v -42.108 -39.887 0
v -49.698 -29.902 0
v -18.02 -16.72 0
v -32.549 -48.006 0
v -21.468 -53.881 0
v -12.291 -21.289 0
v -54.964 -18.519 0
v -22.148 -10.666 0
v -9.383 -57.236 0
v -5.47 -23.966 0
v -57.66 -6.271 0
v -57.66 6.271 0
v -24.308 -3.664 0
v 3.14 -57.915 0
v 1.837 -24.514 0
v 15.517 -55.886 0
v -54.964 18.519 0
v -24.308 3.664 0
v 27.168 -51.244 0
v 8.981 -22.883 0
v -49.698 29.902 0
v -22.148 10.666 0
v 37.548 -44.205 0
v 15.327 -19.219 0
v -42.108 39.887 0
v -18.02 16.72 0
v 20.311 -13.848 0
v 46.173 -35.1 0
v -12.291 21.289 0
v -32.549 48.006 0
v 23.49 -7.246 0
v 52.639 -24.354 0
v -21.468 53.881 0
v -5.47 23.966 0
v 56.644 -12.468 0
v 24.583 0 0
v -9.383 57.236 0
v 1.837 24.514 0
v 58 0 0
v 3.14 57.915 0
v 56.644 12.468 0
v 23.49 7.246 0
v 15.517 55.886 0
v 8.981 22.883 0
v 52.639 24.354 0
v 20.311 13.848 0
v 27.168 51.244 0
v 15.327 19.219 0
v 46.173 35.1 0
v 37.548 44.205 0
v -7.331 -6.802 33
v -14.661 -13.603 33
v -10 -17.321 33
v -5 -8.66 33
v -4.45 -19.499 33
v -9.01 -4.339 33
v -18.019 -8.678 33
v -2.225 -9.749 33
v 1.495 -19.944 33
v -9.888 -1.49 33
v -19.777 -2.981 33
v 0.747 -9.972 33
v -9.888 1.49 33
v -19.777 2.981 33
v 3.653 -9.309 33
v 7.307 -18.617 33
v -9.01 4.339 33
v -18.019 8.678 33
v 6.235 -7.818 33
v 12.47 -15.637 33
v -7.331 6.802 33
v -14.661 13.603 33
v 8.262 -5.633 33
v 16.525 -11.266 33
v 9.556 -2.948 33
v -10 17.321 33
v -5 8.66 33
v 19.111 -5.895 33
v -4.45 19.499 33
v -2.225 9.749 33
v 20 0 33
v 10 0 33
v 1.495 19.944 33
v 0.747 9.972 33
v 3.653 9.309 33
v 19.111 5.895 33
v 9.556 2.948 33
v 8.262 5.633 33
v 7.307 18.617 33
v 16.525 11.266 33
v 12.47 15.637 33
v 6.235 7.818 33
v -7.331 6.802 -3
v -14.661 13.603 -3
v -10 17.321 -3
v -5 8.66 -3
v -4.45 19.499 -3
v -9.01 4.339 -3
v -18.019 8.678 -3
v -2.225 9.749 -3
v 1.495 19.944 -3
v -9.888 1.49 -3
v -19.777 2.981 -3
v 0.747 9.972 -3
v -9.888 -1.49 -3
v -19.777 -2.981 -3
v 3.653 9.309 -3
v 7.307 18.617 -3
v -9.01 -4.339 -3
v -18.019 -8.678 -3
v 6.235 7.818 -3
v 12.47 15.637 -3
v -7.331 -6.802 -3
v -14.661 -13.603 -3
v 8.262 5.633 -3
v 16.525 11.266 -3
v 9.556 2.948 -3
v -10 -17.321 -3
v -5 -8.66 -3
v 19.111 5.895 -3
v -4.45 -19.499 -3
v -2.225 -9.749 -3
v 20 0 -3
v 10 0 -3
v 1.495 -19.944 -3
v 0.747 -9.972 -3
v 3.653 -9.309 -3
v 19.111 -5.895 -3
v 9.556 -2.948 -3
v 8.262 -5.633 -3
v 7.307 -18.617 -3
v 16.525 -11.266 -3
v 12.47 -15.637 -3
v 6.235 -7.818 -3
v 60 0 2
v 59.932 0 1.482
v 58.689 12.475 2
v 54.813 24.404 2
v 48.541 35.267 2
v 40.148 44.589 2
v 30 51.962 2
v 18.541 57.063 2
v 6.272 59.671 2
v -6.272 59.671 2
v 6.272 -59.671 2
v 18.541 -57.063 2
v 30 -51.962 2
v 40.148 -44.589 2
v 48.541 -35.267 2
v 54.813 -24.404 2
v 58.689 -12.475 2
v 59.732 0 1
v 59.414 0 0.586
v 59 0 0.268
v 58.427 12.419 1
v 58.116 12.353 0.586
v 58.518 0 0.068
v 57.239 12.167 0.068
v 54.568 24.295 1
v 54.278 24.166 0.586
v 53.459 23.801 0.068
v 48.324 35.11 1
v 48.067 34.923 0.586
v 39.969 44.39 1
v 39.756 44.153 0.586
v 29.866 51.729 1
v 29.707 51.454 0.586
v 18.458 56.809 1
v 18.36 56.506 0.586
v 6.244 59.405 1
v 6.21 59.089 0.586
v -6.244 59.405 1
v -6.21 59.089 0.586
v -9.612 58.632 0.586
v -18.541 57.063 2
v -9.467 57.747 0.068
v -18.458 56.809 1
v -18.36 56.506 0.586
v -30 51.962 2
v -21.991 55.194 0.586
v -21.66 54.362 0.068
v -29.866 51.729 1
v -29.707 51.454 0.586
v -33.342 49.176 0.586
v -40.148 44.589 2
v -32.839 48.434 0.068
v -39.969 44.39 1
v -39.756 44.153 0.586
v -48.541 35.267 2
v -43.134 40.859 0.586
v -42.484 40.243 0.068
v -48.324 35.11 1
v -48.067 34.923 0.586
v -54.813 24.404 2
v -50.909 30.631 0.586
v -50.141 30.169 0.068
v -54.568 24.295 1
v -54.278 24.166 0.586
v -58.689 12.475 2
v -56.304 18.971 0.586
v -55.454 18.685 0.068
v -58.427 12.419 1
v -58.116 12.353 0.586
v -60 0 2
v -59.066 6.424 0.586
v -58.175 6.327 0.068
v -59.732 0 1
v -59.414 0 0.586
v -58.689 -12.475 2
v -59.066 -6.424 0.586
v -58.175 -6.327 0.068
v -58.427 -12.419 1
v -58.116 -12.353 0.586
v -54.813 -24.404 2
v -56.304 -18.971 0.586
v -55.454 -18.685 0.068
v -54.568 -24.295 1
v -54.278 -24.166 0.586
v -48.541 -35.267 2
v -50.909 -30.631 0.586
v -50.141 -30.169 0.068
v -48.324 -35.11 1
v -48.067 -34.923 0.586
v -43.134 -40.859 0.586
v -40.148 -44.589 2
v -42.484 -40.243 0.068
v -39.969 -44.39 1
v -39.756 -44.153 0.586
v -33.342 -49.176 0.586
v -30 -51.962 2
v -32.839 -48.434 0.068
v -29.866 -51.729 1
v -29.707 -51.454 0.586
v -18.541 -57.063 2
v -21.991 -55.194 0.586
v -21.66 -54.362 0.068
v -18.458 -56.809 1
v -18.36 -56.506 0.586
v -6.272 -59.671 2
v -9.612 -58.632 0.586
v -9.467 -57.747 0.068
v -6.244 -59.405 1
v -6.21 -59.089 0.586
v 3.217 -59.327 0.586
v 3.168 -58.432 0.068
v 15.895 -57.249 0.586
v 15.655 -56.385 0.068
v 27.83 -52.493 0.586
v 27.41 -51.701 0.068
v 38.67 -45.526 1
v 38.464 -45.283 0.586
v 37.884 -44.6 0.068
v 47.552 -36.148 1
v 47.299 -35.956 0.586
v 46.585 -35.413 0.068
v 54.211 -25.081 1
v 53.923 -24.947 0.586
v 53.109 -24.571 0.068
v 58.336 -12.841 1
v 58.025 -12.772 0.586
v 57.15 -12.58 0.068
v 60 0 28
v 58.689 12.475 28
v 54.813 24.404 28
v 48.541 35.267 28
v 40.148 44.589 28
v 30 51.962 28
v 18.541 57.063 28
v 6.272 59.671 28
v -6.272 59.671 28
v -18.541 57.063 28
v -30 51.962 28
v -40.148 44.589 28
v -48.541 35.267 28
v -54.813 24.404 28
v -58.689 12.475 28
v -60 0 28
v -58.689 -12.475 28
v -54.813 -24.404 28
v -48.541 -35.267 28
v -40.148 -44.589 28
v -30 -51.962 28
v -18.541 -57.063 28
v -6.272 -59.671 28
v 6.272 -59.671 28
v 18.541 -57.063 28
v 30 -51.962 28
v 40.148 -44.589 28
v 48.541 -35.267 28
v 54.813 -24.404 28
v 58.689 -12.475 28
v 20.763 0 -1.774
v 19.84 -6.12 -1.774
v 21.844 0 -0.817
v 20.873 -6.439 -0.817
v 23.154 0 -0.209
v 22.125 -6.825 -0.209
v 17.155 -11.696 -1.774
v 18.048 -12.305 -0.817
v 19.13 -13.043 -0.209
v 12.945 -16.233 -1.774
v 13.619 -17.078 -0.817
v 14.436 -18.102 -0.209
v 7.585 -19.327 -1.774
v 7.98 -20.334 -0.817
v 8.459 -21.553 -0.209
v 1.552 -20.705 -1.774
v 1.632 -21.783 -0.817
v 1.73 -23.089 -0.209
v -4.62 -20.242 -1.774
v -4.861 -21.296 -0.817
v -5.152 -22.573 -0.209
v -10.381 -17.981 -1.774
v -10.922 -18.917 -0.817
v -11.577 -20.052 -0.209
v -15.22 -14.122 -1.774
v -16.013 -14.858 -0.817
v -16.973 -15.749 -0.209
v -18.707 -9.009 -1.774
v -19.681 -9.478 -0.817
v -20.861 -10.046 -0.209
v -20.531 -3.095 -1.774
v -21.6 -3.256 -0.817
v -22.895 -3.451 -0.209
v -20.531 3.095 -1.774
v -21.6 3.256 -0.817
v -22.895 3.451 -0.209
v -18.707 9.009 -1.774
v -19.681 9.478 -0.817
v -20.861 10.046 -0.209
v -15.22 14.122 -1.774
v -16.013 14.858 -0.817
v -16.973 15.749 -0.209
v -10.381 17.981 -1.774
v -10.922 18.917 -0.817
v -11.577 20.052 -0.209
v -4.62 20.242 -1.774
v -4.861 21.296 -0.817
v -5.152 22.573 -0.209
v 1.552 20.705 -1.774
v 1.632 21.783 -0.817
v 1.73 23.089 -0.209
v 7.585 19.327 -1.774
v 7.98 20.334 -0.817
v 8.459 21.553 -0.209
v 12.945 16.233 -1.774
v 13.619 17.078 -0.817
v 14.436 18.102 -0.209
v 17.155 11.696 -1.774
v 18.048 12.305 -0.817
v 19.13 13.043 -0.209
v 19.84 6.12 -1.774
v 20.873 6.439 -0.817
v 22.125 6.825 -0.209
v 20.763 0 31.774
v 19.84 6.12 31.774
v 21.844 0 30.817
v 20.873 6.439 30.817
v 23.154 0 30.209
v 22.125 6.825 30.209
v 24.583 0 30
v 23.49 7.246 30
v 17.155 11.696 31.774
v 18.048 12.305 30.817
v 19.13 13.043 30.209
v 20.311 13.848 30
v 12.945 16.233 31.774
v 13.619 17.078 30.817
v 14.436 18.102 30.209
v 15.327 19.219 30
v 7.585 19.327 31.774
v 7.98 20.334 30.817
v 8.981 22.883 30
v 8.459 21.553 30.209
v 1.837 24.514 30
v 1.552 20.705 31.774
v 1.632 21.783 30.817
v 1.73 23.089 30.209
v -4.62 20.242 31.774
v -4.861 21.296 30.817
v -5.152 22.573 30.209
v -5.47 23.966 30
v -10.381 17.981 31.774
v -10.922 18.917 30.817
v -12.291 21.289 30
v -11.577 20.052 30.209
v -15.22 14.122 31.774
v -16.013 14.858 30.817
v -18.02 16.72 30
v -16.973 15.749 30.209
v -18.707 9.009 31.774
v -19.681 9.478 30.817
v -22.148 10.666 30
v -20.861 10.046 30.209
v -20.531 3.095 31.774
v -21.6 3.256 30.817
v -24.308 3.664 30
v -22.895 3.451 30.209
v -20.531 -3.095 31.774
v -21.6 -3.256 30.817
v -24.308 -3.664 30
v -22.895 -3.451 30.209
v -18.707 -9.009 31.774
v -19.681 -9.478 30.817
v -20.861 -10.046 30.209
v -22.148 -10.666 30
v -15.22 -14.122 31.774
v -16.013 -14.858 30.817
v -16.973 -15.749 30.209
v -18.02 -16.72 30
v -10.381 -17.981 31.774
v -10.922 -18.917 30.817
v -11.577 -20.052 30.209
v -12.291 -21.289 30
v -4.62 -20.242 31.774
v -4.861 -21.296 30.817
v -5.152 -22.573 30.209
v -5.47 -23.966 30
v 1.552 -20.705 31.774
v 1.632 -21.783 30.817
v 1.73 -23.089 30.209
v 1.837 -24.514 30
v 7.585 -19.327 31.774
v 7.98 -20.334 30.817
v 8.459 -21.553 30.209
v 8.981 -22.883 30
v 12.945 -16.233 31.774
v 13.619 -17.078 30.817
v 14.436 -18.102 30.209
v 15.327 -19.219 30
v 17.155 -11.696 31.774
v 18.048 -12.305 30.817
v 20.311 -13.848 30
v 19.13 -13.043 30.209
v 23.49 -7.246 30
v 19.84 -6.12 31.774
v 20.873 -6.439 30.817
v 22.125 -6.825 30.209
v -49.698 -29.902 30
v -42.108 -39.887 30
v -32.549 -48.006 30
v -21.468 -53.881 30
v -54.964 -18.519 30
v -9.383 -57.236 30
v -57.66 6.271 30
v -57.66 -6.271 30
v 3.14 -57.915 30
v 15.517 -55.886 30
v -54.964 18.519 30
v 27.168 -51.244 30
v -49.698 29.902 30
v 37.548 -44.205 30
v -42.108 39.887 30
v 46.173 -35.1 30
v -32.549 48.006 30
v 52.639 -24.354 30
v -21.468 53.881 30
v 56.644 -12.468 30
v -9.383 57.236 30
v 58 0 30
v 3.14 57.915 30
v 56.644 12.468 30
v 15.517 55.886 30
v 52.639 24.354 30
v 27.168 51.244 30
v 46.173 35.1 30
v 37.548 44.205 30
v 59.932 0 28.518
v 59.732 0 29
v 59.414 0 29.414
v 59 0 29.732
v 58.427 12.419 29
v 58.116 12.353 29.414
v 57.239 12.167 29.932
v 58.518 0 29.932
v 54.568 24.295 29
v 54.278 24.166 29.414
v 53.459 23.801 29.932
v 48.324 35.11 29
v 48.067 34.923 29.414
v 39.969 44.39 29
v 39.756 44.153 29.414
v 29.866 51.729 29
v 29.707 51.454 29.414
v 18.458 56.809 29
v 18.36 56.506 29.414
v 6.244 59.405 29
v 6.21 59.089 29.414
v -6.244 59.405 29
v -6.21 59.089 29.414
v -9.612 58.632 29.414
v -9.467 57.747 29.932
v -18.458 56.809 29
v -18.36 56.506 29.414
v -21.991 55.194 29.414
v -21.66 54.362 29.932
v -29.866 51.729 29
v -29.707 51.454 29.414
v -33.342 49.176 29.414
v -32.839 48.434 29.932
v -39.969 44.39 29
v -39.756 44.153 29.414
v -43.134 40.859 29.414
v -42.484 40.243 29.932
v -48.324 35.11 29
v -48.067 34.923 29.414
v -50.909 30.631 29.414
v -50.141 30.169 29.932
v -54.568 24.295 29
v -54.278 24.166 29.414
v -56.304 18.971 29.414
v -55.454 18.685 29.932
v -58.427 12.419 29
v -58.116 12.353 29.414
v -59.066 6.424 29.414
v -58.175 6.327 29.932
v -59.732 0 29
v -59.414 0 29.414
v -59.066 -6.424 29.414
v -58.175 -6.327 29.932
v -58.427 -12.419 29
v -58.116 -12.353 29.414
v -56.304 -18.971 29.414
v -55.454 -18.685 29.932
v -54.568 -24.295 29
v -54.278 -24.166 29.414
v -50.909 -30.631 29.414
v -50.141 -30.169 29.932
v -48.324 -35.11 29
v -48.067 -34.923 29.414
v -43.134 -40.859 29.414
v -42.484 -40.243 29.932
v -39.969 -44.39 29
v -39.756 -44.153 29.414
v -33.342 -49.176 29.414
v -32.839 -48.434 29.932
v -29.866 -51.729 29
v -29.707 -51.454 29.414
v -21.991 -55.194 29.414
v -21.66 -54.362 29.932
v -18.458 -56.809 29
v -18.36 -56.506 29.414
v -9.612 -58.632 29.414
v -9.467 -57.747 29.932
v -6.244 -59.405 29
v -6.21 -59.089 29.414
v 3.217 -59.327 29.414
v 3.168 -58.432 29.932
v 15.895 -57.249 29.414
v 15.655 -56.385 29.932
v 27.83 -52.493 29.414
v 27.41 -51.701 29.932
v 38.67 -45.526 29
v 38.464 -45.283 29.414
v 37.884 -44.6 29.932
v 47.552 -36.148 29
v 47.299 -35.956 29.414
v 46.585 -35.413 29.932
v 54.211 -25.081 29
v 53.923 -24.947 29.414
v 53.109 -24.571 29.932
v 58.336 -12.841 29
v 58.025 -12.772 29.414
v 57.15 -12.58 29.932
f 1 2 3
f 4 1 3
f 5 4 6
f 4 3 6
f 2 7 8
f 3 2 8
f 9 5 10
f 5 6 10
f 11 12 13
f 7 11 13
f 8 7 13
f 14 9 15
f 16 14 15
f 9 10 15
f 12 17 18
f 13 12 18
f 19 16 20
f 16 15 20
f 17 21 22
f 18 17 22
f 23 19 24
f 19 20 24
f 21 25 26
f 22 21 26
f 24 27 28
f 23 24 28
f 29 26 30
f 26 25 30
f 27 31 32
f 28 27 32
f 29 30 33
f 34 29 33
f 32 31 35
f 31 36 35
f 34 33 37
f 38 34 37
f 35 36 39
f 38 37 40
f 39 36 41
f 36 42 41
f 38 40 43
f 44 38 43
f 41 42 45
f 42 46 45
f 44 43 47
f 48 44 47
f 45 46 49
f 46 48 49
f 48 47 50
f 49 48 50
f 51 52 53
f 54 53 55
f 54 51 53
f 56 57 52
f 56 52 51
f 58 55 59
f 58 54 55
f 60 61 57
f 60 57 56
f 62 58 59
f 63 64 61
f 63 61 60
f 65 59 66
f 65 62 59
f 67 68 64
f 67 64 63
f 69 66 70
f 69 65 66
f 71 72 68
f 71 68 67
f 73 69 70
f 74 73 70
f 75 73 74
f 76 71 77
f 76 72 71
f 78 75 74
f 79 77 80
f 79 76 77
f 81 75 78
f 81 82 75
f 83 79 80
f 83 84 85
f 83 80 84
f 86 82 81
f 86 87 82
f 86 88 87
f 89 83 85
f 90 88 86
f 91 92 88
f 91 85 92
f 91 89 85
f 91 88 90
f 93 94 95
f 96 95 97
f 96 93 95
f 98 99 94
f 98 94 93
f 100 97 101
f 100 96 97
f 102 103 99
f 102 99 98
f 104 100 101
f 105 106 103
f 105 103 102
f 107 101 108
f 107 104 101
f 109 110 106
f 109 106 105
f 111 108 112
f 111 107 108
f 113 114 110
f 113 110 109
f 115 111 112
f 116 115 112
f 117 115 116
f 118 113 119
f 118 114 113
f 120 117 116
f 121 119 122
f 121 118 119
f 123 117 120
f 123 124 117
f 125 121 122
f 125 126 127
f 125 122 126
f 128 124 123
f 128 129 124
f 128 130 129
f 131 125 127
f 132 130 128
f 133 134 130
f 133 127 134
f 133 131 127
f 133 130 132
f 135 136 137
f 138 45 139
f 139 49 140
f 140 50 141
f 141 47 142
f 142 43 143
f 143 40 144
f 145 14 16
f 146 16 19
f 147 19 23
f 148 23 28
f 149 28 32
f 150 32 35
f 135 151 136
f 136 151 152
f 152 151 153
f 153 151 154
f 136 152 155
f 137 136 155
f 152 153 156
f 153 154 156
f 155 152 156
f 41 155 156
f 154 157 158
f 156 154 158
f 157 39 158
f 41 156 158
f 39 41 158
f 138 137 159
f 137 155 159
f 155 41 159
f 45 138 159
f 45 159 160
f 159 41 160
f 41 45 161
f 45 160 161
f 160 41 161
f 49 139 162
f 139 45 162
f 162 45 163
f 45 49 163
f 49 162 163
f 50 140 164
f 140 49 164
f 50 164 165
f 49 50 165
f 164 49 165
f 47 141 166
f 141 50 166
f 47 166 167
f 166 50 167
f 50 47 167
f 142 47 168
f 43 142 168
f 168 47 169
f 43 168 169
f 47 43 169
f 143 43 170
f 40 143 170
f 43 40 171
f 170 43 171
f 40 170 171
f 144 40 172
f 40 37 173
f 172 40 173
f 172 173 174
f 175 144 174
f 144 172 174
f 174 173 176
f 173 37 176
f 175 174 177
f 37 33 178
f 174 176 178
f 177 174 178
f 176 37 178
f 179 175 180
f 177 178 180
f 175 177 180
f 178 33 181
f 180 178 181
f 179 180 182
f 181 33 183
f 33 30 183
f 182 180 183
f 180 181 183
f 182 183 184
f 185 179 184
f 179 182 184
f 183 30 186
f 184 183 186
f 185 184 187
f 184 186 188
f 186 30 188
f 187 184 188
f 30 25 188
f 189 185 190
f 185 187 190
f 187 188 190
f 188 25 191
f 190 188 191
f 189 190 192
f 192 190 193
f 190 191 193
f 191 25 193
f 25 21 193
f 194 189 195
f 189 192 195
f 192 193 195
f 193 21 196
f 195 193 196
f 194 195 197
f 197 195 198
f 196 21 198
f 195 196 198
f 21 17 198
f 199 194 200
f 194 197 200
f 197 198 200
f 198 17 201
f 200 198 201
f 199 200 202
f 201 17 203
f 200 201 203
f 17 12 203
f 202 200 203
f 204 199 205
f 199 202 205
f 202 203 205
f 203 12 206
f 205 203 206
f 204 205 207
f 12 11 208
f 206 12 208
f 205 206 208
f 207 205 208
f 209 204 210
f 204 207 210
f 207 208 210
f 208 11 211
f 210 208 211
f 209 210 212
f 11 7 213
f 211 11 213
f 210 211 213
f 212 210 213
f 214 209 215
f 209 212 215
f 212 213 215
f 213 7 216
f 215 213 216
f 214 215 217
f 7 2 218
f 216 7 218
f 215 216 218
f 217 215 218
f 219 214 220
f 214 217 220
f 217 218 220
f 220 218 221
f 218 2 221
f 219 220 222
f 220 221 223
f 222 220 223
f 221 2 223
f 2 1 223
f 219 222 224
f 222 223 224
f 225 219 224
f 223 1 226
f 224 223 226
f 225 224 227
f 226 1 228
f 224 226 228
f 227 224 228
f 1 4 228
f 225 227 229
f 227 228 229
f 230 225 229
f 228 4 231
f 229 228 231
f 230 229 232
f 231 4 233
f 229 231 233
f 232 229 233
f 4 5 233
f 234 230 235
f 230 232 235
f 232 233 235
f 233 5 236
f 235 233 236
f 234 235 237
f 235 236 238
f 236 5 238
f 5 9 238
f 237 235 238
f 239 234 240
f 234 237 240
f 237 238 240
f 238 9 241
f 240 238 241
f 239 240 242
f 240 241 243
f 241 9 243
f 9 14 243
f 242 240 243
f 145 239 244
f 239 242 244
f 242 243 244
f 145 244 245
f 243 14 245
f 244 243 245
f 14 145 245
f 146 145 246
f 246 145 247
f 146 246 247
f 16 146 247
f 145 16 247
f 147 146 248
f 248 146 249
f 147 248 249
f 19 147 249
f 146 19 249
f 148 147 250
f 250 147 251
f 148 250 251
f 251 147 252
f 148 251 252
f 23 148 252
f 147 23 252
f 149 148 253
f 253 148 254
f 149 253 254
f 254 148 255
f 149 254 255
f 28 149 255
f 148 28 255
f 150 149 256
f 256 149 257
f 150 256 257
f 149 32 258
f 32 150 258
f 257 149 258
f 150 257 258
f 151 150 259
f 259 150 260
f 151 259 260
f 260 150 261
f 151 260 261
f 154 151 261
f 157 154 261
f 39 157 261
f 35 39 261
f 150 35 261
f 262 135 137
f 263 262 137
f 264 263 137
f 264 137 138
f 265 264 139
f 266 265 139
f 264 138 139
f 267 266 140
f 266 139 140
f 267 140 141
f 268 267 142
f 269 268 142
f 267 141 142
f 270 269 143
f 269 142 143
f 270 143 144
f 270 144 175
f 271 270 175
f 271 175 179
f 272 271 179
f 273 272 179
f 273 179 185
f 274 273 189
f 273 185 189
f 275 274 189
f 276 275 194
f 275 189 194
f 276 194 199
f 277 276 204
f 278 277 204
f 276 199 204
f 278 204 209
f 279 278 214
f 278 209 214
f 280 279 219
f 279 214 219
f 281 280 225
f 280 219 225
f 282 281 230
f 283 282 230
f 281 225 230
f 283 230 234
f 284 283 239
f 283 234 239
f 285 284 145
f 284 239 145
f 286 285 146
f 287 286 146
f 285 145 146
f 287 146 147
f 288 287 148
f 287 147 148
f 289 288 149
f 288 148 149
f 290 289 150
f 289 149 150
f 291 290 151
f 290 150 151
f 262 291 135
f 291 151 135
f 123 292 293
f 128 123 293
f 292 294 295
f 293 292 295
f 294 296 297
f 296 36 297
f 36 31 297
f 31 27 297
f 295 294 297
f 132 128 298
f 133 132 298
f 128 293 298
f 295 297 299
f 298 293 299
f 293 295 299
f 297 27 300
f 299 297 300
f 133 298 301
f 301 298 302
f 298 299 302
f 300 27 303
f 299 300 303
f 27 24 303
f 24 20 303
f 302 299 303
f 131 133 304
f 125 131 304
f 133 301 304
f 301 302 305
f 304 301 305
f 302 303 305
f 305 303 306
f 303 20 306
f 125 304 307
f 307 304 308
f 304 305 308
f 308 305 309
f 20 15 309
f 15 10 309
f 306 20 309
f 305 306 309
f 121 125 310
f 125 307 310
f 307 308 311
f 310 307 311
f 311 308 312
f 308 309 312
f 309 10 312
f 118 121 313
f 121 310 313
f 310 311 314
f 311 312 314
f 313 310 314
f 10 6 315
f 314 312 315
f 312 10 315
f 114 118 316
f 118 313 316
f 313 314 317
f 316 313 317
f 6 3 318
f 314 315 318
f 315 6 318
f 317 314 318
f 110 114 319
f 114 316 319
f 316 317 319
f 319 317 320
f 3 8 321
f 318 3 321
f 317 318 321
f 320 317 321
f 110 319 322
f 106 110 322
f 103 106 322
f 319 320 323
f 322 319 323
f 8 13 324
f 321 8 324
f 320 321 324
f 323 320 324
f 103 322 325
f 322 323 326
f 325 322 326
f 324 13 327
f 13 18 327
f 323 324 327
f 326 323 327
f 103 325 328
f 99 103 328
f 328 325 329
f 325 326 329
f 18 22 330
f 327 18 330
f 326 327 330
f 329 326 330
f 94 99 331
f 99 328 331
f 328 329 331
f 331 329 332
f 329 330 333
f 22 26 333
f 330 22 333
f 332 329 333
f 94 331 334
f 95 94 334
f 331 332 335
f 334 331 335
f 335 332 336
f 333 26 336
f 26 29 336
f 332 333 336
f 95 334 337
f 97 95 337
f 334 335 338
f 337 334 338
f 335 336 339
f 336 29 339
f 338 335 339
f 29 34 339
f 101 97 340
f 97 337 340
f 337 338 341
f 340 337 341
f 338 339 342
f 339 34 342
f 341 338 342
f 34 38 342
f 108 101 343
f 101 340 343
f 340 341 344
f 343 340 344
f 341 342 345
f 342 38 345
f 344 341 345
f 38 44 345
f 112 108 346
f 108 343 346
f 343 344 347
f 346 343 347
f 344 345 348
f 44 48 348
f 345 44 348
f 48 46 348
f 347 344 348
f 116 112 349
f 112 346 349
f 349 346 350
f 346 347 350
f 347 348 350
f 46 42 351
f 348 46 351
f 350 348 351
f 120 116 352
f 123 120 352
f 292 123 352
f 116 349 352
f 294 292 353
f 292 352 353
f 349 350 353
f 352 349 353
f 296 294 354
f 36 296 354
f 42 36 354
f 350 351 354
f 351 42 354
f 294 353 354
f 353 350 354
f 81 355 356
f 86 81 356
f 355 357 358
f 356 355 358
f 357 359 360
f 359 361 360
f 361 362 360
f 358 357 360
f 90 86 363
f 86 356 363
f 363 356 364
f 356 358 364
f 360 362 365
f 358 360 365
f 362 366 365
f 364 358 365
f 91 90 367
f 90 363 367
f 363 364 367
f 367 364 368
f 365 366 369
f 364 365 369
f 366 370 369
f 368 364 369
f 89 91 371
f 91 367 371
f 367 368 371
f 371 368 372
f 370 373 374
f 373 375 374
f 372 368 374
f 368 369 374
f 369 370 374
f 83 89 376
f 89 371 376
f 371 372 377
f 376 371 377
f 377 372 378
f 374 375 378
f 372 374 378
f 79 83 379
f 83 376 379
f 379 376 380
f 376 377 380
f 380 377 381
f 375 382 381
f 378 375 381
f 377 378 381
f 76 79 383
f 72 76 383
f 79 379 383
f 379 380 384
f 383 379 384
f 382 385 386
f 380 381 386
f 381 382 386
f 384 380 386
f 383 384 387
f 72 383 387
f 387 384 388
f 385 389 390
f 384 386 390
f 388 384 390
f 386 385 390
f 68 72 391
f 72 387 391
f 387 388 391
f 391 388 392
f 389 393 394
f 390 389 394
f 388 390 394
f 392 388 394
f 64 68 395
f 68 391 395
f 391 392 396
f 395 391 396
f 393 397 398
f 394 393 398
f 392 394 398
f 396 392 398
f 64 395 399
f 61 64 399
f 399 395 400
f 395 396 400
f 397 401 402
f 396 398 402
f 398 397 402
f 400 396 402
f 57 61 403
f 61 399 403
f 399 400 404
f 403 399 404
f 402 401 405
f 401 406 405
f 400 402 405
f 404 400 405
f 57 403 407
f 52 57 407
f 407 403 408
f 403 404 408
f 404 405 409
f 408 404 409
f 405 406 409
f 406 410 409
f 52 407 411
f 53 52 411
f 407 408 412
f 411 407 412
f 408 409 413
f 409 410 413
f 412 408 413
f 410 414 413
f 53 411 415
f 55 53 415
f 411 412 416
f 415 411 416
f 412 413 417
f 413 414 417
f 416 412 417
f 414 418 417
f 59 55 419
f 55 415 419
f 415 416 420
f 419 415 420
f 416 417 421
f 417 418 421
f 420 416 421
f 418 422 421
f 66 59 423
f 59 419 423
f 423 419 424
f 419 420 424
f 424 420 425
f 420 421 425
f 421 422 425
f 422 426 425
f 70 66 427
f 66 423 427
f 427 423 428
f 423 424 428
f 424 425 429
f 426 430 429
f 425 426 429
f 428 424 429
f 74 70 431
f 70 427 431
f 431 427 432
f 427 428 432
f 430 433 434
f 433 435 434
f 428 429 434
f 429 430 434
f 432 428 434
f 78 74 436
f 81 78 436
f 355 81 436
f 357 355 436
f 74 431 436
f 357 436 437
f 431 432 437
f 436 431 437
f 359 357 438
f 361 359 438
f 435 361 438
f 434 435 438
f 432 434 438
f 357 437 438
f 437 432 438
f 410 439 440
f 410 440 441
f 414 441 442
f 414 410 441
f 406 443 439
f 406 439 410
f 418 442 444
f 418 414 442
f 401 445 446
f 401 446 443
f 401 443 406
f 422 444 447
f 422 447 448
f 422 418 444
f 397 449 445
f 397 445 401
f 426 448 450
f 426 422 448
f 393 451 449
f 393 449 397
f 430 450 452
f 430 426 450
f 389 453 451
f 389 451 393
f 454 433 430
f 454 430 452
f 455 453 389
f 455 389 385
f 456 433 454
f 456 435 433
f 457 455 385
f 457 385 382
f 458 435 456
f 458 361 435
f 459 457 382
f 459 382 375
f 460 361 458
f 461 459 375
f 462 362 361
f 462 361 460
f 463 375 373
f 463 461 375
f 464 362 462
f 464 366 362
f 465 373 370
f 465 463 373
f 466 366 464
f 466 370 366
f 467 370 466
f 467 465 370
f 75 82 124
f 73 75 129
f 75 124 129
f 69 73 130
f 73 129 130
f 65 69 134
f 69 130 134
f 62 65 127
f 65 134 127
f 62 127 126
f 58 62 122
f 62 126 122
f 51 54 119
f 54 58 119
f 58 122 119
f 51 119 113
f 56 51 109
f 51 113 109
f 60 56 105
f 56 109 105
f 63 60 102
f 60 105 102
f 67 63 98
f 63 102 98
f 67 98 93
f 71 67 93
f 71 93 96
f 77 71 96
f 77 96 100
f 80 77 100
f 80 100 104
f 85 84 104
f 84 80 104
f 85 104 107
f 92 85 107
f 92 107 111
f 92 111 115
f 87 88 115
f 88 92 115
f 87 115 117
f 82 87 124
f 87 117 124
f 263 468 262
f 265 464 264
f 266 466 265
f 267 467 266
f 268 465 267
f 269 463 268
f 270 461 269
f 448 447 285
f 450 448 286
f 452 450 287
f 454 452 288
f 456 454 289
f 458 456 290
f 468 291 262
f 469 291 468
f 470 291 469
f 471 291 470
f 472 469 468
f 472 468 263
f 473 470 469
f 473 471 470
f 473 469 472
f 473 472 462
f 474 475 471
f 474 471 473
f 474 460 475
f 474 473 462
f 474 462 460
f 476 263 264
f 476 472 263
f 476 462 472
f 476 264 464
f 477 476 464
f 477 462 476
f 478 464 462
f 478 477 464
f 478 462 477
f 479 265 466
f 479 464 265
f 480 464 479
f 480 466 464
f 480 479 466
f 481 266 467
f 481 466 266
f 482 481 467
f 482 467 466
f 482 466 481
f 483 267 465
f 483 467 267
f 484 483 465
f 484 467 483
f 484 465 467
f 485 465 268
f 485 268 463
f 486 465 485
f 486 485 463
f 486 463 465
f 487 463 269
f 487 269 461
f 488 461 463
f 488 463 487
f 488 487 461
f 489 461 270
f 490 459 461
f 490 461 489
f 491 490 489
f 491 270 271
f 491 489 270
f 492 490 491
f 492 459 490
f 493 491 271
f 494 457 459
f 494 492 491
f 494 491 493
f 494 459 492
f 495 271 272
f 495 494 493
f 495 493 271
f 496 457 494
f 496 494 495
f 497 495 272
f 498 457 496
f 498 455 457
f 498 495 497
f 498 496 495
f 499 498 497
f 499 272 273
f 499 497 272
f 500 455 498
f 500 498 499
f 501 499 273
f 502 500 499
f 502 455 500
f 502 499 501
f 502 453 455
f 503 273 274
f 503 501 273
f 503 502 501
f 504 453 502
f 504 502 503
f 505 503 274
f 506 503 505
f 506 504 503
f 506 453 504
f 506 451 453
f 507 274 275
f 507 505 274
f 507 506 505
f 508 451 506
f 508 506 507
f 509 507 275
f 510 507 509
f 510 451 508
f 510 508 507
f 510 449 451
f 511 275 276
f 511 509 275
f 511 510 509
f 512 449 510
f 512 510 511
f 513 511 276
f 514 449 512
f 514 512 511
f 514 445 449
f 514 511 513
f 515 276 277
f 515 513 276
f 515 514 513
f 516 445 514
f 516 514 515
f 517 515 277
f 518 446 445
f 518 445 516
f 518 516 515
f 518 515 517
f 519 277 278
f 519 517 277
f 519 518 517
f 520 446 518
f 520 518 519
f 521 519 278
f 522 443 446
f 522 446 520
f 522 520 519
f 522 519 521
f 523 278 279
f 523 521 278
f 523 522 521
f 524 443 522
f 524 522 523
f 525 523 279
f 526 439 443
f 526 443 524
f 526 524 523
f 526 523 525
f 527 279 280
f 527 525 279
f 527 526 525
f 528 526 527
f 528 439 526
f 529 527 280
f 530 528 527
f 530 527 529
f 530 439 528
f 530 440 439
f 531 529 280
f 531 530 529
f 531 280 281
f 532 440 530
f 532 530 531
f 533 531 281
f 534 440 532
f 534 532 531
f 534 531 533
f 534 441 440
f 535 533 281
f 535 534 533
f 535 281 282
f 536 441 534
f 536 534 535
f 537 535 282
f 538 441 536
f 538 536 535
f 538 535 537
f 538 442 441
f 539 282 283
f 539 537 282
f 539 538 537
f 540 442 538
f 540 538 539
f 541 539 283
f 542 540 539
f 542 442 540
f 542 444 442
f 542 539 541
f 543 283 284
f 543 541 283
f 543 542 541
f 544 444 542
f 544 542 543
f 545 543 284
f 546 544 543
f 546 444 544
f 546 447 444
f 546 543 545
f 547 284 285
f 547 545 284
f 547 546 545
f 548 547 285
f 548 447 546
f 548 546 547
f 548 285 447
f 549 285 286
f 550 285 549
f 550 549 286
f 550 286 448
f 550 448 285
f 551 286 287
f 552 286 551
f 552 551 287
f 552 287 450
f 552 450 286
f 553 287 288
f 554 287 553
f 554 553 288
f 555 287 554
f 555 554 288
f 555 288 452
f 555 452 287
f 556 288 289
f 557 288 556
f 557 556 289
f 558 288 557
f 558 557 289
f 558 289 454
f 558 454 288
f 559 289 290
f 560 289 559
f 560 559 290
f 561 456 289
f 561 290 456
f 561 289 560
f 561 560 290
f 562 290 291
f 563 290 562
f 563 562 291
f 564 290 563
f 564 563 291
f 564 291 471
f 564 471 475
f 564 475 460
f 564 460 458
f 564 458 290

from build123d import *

# Parameters (mm, degrees)
SKETCH1_R           = 60
BOSS_EXTRUDE1_DEPTH = 30
FILLET1_R           = 2
SKETCH6_R           = 20
BOSS_EXTRUDE6_DEPTH = 3
SKETCH9_R           = 10
CUT_EXTRUDE3_DEPTH  = 92.043945535
FILLET4_R           = 5
SKETCH12_R          = 20
BOSS_EXTRUDE9_DEPTH = 3
FILLET7_R           = 5
SKETCH14_R          = 10
CUT_EXTRUDE5_DEPTH  = 93.17374904


with BuildPart() as part:
    # Sketch1 → Boss-Extrude1 (new body)
    with BuildSketch(Plane.XY):
        Circle(SKETCH1_R)
    extrude(amount=BOSS_EXTRUDE1_DEPTH)

    # Fillet1
    fillet1_edges = [part.edges().sort_by_distance(p)[0] for p in [
        (-60, 0, 0),
        (-60, 0, 30),
    ]]
    fillet(fillet1_edges, radius=FILLET1_R)

    # Sketch6 → Boss-Extrude6 (add)
    with BuildSketch(Plane.XY.offset(30)):
        Circle(SKETCH6_R)
    extrude(amount=BOSS_EXTRUDE6_DEPTH)

    # Sketch9 → Cut-Extrude3 (cut, through all)
    with BuildSketch(Plane.XY.offset(33)):
        Circle(SKETCH9_R)
    extrude(amount=-CUT_EXTRUDE3_DEPTH, mode=Mode.SUBTRACT)

    # Fillet4
    # the kernel refuses this fillet: 5 mm, written as the material it adds along each edge
    with BuildSketch(Plane(origin=(0, 0, 30), x_dir=(1, 0, 0), z_dir=(0, -1, 0))) as fillet4_piece_1:
        with BuildLine():
            CenterArc((24.582575695, 5), FILLET4_R, 203.578178478, 66.421821522)
            Line((20, 3), (19.908348486, 2.96))
            ThreePointArc((19.908348486, 2.96), (19.9, 1.5), (19.9, 0))
            Line((19.9, 0), (20, -0.1))
            Line((20, -0.1), (24.582575695, -0.1))
            Line((24.582575695, -0.1), (24.582575695, 0))
        make_face()
    revolve(axis=Axis((0, 0, 30), (0, 0, 1)))

    # Sketch12 → Boss-Extrude9 (add)
    with BuildSketch(Plane(origin=(0, 0, 0), x_dir=(-1, 0, 0), z_dir=(0, 0, -1))):
        with Locations(Location((0, 0, 0), (0, 0, 180))):
            Circle(SKETCH12_R)
    extrude(amount=BOSS_EXTRUDE9_DEPTH)

    # Fillet7
    # the kernel refuses this fillet: 5 mm, written as the material it adds along each edge
    with BuildSketch(Plane(origin=(0, 0, 0), x_dir=(1, 0, 0), z_dir=(0, 1, 0))) as fillet7_piece_1:
        with BuildLine():
            CenterArc((24.582575695, 5), FILLET7_R, 203.578178478, 66.421821522)
            Line((20, 3), (19.908348486, 2.96))
            ThreePointArc((19.908348486, 2.96), (19.9, 1.5), (19.9, 0))
            Line((19.9, 0), (20, -0.1))
            Line((20, -0.1), (24.582575695, -0.1))
            Line((24.582575695, -0.1), (24.582575695, 0))
        make_face()
    revolve(axis=Axis((0, 0, 0), (0, 0, -1)))

    # Sketch14 → Cut-Extrude5 (cut, through all)
    with BuildSketch(Plane(origin=(0, 0, -3), x_dir=(-1, 0, 0), z_dir=(0, 0, -1))):
        with Locations(Location((0, 0, 0), (0, 0, 180))):
            Circle(SKETCH14_R)
    extrude(amount=-CUT_EXTRUDE5_DEPTH, mode=Mode.SUBTRACT)


solid = part.part
